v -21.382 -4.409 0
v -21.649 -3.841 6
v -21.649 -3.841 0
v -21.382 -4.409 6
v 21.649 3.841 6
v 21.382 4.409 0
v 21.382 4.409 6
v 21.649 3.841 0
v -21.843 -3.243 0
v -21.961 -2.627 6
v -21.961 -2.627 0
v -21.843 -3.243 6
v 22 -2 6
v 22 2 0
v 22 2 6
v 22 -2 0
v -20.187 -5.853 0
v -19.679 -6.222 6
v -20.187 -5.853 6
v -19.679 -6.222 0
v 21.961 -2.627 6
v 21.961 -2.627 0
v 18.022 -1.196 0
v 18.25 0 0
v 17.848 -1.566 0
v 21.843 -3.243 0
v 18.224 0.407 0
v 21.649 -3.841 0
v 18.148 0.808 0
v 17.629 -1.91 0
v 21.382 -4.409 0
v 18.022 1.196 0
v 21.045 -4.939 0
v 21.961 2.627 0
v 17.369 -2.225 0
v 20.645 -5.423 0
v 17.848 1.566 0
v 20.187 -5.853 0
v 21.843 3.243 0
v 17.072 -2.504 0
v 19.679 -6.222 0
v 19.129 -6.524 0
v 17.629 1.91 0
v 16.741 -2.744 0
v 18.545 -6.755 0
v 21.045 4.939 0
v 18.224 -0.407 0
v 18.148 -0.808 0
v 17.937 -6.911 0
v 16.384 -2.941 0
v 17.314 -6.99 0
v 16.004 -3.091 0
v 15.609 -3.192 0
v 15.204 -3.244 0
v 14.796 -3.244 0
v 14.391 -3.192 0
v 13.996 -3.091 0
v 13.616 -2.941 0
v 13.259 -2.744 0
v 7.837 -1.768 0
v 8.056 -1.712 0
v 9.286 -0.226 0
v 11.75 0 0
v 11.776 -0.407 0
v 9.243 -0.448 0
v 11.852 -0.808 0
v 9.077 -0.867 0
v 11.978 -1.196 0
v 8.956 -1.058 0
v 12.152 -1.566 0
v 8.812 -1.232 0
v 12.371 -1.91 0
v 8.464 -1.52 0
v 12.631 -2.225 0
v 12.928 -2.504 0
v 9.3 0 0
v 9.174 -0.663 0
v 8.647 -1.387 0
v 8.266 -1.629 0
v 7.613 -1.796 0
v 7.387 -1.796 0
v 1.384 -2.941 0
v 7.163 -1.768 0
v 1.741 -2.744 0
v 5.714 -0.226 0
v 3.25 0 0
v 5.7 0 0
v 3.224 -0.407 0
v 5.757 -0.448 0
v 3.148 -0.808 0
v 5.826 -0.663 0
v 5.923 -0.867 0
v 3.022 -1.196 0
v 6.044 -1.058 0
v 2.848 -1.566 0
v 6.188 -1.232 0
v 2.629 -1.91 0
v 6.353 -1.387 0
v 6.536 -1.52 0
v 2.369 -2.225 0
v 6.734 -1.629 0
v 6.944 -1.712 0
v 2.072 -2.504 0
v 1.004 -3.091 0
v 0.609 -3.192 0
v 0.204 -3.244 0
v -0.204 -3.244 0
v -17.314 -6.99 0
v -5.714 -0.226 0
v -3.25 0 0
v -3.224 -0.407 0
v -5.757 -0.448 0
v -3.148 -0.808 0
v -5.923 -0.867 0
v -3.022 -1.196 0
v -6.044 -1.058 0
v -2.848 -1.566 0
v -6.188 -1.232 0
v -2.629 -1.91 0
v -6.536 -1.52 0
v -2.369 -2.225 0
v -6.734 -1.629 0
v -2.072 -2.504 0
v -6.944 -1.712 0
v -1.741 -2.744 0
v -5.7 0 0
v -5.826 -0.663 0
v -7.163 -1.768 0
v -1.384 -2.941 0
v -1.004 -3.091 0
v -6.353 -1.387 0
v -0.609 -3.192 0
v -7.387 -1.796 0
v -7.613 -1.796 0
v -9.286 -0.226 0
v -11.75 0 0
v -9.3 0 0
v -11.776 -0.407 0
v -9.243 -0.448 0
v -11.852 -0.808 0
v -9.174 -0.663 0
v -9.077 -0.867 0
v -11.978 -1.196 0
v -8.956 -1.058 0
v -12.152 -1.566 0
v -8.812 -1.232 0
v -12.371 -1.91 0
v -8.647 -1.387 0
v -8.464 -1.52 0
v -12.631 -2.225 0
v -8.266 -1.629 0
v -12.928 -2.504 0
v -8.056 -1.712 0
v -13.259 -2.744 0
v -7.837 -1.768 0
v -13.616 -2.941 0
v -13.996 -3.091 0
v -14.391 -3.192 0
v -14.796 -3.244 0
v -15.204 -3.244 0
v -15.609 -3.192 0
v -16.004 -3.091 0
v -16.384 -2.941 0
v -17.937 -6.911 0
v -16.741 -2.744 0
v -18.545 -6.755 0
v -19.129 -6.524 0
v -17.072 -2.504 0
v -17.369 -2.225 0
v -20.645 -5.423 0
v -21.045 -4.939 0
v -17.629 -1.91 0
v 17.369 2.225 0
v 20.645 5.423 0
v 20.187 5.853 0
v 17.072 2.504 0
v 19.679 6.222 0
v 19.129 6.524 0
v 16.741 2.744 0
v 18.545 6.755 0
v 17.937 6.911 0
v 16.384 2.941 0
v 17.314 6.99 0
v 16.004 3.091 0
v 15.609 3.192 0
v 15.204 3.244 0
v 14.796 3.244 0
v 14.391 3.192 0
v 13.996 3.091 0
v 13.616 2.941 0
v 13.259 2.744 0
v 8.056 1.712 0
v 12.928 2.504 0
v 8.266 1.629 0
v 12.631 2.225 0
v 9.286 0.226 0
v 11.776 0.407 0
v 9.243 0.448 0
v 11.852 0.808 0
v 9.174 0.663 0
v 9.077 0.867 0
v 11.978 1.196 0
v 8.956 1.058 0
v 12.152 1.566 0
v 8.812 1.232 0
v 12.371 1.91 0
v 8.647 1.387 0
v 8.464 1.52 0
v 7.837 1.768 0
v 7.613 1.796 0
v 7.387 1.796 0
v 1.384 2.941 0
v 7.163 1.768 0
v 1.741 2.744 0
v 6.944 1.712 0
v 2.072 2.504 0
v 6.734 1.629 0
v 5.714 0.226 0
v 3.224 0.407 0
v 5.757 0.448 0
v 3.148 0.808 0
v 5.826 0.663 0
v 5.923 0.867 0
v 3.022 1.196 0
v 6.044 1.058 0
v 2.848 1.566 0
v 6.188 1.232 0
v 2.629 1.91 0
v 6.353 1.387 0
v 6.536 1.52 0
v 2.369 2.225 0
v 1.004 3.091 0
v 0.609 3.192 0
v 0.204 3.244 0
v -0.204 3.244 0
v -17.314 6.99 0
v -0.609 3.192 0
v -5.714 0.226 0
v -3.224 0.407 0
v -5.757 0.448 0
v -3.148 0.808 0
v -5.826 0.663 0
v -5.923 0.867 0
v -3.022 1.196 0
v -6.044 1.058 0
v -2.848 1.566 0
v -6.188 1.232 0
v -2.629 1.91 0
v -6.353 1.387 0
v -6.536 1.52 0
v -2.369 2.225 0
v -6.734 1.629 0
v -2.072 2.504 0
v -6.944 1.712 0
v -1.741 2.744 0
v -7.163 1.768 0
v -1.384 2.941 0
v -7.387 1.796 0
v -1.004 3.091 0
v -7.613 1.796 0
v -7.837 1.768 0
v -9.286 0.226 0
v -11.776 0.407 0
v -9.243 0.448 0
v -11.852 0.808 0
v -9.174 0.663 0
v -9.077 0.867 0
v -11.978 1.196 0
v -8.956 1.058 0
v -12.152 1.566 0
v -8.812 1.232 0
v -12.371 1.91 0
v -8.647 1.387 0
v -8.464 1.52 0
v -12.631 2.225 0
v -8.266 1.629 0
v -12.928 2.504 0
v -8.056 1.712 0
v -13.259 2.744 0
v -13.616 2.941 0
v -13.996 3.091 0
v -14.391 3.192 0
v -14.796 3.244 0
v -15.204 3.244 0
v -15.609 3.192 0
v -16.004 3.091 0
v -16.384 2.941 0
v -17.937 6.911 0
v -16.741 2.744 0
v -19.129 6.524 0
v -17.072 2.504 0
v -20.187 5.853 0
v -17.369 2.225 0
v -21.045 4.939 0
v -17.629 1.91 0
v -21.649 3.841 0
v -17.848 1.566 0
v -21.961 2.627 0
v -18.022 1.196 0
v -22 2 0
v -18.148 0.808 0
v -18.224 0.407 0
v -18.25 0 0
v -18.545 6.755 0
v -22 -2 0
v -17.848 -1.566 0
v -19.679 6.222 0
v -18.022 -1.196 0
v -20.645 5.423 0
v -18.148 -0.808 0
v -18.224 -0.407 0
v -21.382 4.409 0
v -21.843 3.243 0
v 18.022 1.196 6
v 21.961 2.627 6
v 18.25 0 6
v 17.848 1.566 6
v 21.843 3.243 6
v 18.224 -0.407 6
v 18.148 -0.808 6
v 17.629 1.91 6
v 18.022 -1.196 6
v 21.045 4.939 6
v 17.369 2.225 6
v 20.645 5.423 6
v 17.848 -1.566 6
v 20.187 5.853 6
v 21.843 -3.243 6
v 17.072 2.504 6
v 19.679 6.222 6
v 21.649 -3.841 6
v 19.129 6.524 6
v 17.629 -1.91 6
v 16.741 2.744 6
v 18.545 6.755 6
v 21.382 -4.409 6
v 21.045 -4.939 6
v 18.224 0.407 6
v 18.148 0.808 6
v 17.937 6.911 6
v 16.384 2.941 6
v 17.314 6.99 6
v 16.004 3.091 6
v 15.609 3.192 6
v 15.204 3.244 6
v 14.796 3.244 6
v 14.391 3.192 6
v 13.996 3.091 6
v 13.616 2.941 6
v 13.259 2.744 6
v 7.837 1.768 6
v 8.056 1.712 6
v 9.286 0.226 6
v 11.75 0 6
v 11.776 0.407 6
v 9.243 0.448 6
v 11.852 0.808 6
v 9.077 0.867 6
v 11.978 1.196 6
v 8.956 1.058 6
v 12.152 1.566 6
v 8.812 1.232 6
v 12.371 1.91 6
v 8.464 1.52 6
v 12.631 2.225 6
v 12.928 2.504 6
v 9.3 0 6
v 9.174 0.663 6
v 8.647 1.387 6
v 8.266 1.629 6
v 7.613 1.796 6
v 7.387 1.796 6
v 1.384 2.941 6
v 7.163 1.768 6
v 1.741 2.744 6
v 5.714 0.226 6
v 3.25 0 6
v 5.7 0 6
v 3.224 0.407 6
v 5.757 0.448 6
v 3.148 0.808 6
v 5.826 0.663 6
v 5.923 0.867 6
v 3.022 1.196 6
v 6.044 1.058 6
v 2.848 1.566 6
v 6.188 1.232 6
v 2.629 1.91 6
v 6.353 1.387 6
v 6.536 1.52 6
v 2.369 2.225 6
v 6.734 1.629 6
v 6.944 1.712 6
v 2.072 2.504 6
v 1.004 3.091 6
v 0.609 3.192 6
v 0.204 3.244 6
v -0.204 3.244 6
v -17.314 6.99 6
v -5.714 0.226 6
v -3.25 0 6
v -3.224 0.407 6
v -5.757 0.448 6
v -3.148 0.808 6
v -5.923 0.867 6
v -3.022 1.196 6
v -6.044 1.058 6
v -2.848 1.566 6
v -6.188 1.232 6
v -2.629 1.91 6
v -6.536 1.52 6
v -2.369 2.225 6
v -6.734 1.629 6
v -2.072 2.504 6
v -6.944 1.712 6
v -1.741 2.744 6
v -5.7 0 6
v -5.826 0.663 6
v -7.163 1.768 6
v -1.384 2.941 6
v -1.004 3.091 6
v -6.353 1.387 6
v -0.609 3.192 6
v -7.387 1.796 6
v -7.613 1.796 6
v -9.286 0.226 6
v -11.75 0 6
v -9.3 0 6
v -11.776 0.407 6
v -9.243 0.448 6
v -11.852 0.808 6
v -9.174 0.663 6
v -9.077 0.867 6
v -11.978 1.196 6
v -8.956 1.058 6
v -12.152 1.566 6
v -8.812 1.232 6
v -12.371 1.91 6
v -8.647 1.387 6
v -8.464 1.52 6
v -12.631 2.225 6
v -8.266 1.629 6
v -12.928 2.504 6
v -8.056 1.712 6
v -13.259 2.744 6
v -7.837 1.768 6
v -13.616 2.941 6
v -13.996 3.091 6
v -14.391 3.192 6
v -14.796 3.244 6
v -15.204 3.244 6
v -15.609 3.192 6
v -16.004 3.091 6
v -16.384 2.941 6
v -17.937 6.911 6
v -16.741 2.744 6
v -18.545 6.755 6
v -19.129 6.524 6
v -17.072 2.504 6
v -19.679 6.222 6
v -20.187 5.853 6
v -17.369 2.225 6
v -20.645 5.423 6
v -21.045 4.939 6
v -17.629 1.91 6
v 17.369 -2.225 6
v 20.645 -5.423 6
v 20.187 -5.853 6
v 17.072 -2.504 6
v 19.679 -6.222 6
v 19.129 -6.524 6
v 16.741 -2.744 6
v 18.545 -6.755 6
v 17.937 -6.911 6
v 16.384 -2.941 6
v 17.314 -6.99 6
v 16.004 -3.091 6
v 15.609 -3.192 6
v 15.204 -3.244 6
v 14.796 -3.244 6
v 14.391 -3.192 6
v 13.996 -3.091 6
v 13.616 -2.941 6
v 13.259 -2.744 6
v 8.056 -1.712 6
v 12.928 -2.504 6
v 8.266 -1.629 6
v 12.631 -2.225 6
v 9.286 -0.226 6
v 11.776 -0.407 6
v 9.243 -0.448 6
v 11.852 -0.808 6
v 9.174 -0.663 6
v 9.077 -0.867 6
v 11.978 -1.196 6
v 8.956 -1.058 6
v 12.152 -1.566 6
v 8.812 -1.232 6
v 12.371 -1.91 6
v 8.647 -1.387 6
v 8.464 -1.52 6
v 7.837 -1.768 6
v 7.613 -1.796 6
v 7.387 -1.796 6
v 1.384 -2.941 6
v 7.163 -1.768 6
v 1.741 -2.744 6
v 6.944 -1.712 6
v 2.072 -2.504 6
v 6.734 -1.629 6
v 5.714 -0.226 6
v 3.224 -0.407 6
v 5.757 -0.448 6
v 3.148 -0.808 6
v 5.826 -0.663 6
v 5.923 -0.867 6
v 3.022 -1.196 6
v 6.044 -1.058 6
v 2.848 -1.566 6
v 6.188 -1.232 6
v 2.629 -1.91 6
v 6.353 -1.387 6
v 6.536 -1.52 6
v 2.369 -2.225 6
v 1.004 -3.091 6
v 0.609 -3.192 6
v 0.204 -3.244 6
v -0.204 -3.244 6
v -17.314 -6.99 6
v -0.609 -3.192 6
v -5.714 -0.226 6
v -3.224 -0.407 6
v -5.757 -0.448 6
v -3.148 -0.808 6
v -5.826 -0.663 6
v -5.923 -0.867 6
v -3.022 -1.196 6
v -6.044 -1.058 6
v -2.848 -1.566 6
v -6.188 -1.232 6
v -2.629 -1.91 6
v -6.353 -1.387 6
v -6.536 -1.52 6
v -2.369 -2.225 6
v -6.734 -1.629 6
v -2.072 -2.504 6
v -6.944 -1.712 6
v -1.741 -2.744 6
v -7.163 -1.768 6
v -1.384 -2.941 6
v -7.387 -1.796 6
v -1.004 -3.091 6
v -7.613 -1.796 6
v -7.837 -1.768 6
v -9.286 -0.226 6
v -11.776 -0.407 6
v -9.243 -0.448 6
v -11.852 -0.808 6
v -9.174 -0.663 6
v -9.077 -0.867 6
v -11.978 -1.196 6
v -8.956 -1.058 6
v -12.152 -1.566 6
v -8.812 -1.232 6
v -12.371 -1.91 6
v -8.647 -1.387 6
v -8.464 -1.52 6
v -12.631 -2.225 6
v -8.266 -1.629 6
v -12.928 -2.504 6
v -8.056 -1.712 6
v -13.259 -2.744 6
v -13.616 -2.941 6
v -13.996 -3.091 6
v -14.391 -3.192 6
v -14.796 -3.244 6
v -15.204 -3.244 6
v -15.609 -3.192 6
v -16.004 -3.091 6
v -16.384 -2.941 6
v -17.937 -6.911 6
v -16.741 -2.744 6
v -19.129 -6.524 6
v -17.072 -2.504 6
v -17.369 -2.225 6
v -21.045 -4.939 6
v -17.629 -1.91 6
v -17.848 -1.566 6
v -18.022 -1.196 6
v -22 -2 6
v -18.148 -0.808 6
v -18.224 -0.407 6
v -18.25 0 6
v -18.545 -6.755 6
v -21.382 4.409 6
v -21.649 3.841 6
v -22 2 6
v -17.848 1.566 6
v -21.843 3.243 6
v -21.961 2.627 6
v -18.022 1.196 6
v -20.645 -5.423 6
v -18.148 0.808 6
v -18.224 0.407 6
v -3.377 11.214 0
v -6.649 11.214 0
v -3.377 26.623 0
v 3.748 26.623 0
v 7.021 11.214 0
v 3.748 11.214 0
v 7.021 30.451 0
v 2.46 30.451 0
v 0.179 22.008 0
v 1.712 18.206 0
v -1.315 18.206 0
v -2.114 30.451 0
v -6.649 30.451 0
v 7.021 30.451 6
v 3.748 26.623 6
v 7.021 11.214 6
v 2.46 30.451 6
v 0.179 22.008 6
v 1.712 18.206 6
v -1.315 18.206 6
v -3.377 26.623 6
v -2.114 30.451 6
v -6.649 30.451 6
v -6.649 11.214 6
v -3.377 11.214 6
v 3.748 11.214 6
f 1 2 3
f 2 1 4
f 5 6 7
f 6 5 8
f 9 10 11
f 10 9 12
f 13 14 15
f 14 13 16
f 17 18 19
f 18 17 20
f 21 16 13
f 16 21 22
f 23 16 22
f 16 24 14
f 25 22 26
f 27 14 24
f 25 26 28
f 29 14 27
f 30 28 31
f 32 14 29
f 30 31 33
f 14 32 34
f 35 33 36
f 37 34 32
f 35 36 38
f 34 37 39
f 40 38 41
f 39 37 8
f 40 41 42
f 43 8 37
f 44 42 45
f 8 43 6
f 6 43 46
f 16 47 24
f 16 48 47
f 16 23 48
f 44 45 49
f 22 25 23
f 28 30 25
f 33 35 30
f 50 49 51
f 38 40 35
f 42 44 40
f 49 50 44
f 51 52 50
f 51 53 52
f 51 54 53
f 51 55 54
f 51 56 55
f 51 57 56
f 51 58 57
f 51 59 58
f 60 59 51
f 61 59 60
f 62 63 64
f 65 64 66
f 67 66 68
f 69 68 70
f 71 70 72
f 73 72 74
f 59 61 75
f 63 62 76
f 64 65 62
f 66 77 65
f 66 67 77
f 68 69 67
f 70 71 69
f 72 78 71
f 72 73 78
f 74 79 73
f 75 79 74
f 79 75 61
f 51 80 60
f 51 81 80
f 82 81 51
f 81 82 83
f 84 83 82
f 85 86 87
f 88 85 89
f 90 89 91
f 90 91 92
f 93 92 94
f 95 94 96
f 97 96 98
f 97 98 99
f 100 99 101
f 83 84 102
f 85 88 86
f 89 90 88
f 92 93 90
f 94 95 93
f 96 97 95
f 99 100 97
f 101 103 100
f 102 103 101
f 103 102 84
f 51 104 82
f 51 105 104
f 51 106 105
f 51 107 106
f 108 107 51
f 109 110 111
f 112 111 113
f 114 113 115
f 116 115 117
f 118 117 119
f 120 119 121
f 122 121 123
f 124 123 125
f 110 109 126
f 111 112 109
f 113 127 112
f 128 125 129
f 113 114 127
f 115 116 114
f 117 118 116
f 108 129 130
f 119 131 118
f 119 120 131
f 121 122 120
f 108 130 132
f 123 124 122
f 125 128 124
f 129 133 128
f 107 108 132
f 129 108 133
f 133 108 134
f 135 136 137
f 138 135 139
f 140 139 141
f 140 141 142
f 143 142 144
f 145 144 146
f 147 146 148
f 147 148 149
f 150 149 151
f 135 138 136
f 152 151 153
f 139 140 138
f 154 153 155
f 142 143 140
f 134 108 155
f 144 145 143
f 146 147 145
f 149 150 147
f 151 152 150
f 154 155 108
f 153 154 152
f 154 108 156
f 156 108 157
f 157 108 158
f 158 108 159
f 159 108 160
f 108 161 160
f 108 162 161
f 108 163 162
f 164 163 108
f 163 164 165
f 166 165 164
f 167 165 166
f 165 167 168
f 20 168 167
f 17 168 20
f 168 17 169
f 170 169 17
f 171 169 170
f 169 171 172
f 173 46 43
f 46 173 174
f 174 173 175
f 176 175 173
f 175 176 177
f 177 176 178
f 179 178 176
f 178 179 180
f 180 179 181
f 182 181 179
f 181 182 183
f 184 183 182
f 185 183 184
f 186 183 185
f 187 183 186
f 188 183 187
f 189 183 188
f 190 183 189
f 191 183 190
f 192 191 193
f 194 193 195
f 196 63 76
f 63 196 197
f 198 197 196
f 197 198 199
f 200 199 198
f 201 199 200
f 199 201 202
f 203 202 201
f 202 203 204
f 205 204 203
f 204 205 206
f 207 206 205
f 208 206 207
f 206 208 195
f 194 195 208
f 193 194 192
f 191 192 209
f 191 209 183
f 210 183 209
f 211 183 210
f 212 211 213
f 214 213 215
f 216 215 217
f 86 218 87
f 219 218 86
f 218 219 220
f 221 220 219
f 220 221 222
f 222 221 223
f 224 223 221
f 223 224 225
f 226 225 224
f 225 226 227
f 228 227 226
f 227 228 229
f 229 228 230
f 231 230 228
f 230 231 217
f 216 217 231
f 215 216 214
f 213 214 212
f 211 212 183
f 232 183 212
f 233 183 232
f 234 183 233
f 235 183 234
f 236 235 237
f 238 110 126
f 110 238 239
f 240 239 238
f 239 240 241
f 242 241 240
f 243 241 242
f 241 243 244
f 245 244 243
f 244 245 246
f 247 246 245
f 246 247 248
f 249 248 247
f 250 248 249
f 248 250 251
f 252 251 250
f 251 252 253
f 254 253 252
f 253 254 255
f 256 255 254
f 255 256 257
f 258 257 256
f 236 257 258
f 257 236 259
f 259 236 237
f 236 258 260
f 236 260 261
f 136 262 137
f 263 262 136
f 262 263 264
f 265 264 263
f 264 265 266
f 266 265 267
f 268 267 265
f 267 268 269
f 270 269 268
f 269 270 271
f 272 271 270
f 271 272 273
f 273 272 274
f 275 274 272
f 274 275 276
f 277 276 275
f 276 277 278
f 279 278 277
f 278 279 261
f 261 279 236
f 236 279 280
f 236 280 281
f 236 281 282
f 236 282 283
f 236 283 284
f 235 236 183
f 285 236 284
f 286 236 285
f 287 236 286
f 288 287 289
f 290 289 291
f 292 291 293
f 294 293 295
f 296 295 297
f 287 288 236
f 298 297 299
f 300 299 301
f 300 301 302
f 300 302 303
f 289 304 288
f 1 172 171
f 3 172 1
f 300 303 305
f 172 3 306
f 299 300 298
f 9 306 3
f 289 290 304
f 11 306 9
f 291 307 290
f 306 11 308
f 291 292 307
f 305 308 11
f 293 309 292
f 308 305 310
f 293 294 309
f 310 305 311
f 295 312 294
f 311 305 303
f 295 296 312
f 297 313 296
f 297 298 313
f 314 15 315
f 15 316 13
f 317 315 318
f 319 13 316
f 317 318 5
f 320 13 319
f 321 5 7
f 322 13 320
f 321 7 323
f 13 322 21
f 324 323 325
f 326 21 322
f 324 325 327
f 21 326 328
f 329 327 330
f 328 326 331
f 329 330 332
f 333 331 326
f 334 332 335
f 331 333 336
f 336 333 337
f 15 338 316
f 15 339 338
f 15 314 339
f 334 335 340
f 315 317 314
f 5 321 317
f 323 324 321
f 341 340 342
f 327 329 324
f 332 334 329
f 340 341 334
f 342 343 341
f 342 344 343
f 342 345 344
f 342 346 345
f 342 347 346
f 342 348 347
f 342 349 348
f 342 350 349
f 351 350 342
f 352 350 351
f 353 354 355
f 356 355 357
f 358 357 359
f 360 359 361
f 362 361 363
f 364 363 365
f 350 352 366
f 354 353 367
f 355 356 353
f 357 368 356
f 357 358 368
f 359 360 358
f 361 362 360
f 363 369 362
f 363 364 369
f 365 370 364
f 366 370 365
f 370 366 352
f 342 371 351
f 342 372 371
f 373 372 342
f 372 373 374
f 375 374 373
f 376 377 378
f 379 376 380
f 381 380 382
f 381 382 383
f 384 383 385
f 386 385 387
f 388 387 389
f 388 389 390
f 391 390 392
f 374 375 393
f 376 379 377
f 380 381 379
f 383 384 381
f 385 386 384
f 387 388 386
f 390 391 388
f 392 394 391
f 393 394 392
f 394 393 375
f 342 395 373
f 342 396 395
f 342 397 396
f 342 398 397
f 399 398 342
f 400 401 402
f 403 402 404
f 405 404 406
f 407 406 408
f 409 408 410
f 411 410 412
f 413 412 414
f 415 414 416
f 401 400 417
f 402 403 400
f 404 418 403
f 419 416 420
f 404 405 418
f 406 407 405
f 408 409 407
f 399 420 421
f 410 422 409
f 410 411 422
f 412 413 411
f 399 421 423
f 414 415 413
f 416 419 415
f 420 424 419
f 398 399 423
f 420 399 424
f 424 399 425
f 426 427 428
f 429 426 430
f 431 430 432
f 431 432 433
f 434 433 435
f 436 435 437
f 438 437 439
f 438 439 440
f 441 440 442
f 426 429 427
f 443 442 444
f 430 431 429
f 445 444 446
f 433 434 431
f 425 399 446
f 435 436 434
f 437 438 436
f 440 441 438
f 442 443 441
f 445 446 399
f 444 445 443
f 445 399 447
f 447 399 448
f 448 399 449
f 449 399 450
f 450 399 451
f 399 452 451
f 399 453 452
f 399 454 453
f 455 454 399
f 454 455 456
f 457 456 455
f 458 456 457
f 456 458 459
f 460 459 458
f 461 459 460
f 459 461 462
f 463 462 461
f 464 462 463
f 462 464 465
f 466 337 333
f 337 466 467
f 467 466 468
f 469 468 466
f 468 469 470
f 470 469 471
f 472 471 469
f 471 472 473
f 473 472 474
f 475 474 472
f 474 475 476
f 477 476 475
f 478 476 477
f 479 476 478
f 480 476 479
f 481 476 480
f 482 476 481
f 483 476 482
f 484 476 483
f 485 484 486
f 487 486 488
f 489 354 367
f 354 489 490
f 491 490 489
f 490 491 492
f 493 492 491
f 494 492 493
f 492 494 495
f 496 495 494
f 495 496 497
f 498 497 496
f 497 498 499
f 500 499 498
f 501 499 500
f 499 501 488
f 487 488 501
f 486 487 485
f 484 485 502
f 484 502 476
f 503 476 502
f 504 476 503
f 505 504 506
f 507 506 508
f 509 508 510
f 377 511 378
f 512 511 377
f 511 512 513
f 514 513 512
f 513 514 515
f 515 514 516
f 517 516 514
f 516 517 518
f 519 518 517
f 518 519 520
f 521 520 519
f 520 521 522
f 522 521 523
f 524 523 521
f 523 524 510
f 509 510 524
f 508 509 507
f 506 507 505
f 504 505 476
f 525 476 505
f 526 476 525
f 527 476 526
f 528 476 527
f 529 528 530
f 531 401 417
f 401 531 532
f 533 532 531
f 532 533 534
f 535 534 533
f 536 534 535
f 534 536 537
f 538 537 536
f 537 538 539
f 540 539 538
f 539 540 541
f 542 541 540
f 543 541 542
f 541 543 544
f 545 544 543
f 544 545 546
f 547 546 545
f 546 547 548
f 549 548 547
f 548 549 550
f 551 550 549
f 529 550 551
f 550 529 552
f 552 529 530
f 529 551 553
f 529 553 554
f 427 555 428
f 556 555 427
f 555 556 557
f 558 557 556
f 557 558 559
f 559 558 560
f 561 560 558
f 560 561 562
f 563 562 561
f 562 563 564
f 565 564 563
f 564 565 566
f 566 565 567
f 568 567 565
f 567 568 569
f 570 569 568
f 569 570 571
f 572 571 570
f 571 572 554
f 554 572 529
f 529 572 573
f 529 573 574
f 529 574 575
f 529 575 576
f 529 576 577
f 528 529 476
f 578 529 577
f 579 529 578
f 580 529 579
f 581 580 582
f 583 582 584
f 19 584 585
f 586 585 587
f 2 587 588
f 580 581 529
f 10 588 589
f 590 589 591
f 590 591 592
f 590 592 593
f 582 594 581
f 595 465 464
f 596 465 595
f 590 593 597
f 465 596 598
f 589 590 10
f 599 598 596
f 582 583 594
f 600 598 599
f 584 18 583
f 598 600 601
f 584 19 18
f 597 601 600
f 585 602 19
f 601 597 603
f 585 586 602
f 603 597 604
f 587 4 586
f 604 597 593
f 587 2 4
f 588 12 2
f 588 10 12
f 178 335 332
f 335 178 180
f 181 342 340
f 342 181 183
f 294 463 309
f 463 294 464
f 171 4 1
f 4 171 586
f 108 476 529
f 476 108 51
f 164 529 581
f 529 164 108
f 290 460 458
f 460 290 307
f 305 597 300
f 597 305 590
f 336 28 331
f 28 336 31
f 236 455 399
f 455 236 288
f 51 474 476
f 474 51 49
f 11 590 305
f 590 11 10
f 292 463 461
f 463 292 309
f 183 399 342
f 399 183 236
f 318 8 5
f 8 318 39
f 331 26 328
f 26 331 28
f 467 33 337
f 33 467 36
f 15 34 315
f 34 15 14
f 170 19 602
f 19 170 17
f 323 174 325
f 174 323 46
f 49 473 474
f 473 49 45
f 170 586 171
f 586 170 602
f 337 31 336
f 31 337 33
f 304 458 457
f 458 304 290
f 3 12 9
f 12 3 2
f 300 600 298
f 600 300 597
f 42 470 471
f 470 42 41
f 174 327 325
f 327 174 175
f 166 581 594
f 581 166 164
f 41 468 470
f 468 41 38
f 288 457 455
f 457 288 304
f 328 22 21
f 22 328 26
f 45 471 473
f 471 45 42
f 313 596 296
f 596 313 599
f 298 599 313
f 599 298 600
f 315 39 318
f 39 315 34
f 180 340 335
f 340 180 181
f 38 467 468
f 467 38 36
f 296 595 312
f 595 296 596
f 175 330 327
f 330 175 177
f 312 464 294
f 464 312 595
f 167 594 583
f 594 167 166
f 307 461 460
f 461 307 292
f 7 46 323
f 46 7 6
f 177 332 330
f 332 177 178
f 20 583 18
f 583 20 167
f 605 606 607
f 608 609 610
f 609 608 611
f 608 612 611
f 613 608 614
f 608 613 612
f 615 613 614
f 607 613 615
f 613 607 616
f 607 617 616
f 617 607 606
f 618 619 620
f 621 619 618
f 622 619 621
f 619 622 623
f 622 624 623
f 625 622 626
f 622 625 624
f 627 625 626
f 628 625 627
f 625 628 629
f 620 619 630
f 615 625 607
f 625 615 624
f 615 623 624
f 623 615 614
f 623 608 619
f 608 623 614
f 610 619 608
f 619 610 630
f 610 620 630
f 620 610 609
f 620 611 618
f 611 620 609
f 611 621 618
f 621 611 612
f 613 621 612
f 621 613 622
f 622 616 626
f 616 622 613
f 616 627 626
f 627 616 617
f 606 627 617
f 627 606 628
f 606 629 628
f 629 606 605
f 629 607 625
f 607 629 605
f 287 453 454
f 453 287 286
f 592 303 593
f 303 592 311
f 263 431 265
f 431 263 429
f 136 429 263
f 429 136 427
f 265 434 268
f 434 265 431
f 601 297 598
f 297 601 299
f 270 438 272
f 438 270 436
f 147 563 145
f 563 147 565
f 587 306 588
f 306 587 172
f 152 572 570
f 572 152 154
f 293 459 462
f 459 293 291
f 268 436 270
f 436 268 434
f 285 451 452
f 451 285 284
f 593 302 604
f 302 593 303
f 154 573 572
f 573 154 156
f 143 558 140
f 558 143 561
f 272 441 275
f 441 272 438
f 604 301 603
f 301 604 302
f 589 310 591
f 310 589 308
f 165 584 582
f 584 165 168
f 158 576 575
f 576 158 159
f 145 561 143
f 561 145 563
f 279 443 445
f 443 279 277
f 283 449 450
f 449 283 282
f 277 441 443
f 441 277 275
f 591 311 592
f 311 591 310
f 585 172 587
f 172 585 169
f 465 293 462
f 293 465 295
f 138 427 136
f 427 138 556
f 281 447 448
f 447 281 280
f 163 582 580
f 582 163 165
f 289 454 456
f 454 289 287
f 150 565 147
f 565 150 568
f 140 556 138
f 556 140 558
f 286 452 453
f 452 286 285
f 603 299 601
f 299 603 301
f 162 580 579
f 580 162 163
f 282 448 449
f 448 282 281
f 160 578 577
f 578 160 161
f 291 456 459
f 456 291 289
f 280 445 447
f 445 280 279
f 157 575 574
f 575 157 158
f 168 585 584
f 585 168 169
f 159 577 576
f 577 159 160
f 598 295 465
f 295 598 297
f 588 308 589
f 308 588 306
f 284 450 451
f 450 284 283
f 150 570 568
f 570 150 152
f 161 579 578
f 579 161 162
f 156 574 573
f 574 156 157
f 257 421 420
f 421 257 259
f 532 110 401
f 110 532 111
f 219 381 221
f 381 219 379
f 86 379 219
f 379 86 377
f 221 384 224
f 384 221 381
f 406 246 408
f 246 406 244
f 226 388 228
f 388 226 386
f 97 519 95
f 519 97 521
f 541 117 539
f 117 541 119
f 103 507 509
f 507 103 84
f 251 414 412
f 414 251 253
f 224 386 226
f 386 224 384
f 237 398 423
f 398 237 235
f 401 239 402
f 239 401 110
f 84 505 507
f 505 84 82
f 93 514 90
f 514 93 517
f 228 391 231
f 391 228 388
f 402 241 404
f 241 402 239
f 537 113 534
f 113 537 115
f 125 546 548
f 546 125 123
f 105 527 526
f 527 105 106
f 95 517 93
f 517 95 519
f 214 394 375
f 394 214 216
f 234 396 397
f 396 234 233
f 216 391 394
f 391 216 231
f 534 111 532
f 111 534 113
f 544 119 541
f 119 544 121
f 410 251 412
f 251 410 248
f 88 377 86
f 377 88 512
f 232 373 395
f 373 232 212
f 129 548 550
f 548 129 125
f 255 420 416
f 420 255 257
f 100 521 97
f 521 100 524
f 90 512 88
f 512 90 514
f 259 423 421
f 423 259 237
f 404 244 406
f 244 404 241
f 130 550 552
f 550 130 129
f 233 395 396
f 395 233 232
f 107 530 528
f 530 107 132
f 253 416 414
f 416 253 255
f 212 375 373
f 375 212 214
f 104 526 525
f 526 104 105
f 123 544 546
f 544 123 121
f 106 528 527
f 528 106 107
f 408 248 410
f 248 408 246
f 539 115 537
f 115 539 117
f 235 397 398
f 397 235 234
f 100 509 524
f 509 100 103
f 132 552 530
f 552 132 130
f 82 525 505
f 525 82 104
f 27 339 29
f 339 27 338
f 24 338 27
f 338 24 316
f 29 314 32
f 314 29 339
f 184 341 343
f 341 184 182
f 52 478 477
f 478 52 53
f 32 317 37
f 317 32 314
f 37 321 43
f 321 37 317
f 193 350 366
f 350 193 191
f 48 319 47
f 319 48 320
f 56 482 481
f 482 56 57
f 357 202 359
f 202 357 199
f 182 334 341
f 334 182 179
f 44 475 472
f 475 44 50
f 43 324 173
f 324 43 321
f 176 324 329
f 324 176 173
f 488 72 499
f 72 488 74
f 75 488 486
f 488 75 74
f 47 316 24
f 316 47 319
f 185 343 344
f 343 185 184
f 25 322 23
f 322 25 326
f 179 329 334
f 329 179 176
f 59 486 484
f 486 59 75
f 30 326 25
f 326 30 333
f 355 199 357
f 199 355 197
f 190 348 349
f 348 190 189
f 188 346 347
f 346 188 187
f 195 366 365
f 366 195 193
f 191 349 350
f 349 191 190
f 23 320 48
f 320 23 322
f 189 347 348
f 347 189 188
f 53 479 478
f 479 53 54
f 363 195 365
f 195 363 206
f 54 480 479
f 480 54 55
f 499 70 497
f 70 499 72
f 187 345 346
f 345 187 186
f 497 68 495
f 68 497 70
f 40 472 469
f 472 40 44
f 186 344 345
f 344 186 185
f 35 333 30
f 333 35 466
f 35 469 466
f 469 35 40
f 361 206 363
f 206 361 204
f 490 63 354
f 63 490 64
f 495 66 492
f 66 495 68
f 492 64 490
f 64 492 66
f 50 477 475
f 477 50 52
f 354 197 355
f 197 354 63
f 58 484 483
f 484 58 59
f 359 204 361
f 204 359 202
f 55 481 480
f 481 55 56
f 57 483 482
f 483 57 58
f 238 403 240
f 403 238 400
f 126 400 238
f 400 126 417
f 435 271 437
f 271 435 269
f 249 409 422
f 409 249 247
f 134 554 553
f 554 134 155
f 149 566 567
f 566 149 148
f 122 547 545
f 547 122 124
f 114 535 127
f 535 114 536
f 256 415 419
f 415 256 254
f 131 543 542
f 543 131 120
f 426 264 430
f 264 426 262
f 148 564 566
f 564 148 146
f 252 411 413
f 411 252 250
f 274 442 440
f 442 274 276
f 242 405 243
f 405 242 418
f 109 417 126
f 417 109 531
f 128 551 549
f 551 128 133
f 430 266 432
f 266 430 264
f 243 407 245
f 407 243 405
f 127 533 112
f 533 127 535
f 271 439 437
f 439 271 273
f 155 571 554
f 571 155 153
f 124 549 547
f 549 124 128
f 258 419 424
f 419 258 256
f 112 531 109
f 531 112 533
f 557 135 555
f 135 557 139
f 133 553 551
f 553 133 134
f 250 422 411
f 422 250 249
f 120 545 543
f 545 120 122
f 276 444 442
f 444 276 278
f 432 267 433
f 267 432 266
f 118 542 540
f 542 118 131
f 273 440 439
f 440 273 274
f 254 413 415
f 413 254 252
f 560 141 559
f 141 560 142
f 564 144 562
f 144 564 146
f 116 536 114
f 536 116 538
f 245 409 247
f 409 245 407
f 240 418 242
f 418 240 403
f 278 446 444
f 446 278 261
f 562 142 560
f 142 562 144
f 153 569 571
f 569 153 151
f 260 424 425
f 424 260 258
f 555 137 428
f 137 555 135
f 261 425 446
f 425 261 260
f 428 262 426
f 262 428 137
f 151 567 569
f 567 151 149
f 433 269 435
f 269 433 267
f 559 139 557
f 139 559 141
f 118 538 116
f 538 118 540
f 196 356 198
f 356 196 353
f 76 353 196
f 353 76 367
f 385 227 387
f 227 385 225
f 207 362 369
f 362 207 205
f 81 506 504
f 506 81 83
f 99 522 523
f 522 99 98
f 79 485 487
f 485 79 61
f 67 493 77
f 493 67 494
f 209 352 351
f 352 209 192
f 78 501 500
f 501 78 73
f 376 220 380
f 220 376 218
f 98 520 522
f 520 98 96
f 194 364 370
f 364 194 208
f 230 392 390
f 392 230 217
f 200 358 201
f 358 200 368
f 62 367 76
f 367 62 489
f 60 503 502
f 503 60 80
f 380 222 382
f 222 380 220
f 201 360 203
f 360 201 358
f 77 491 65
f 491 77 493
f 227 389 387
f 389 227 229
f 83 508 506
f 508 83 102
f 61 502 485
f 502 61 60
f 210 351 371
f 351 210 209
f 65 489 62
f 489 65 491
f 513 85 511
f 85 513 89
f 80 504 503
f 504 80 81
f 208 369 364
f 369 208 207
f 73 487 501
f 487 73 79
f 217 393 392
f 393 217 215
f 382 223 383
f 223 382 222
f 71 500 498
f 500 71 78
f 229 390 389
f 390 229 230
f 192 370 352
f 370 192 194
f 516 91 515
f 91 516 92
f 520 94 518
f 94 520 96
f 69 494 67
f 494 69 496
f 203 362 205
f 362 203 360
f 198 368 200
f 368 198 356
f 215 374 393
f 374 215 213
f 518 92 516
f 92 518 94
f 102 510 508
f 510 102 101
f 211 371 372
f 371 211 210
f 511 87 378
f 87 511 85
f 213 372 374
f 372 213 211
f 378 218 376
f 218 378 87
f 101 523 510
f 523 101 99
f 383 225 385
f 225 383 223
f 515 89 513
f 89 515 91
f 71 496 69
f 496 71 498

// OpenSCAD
$fn = 50;


difference() {
	union() {
		hull() {
			translate(v = [-17.0000000000, 2.0000000000, 0]) {
				cylinder(h = 6, r = 5);
			}
			translate(v = [17.0000000000, 2.0000000000, 0]) {
				cylinder(h = 6, r = 5);
			}
			translate(v = [-17.0000000000, -2.0000000000, 0]) {
				cylinder(h = 6, r = 5);
			}
			translate(v = [17.0000000000, -2.0000000000, 0]) {
				cylinder(h = 6, r = 5);
			}
		}
		translate(v = [0, 30.0000000000, 0]) {
			linear_extrude(height = 6) {
				text(font = "DejaVu Sans Mono:style=Bold", halign = "center", size = 19.0000000000, text = "M", valign = "top");
			}
		}
	}
	union() {
		translate(v = [-15.0000000000, 0.0000000000, 0]) {
			translate(v = [0, 0, -100]) {
				cylinder(h = 200, r = 3.2500000000);
			}
		}
		translate(v = [0, 0, -100]) {
			cylinder(h = 200, r = 3.2500000000);
		}
		translate(v = [15.0000000000, 0.0000000000, 0]) {
			translate(v = [0, 0, -100]) {
				cylinder(h = 200, r = 3.2500000000);
			}
		}
		translate(v = [-15.0000000000, 0.0000000000, 0]) {
			translate(v = [0, 0, -100]) {
				cylinder(h = 200, r = 1.8000000000);
			}
		}
		translate(v = [-7.5000000000, 0.0000000000, 0]) {
			translate(v = [0, 0, -100]) {
				cylinder(h = 200, r = 1.8000000000);
			}
		}
		translate(v = [0, 0, -100]) {
			cylinder(h = 200, r = 1.8000000000);
		}
		translate(v = [7.5000000000, 0.0000000000, 0]) {
			translate(v = [0, 0, -100]) {
				cylinder(h = 200, r = 1.8000000000);
			}
		}
		translate(v = [15.0000000000, 0.0000000000, 0]) {
			translate(v = [0, 0, -100]) {
				cylinder(h = 200, r = 1.8000000000);
			}
		}
	}
}
